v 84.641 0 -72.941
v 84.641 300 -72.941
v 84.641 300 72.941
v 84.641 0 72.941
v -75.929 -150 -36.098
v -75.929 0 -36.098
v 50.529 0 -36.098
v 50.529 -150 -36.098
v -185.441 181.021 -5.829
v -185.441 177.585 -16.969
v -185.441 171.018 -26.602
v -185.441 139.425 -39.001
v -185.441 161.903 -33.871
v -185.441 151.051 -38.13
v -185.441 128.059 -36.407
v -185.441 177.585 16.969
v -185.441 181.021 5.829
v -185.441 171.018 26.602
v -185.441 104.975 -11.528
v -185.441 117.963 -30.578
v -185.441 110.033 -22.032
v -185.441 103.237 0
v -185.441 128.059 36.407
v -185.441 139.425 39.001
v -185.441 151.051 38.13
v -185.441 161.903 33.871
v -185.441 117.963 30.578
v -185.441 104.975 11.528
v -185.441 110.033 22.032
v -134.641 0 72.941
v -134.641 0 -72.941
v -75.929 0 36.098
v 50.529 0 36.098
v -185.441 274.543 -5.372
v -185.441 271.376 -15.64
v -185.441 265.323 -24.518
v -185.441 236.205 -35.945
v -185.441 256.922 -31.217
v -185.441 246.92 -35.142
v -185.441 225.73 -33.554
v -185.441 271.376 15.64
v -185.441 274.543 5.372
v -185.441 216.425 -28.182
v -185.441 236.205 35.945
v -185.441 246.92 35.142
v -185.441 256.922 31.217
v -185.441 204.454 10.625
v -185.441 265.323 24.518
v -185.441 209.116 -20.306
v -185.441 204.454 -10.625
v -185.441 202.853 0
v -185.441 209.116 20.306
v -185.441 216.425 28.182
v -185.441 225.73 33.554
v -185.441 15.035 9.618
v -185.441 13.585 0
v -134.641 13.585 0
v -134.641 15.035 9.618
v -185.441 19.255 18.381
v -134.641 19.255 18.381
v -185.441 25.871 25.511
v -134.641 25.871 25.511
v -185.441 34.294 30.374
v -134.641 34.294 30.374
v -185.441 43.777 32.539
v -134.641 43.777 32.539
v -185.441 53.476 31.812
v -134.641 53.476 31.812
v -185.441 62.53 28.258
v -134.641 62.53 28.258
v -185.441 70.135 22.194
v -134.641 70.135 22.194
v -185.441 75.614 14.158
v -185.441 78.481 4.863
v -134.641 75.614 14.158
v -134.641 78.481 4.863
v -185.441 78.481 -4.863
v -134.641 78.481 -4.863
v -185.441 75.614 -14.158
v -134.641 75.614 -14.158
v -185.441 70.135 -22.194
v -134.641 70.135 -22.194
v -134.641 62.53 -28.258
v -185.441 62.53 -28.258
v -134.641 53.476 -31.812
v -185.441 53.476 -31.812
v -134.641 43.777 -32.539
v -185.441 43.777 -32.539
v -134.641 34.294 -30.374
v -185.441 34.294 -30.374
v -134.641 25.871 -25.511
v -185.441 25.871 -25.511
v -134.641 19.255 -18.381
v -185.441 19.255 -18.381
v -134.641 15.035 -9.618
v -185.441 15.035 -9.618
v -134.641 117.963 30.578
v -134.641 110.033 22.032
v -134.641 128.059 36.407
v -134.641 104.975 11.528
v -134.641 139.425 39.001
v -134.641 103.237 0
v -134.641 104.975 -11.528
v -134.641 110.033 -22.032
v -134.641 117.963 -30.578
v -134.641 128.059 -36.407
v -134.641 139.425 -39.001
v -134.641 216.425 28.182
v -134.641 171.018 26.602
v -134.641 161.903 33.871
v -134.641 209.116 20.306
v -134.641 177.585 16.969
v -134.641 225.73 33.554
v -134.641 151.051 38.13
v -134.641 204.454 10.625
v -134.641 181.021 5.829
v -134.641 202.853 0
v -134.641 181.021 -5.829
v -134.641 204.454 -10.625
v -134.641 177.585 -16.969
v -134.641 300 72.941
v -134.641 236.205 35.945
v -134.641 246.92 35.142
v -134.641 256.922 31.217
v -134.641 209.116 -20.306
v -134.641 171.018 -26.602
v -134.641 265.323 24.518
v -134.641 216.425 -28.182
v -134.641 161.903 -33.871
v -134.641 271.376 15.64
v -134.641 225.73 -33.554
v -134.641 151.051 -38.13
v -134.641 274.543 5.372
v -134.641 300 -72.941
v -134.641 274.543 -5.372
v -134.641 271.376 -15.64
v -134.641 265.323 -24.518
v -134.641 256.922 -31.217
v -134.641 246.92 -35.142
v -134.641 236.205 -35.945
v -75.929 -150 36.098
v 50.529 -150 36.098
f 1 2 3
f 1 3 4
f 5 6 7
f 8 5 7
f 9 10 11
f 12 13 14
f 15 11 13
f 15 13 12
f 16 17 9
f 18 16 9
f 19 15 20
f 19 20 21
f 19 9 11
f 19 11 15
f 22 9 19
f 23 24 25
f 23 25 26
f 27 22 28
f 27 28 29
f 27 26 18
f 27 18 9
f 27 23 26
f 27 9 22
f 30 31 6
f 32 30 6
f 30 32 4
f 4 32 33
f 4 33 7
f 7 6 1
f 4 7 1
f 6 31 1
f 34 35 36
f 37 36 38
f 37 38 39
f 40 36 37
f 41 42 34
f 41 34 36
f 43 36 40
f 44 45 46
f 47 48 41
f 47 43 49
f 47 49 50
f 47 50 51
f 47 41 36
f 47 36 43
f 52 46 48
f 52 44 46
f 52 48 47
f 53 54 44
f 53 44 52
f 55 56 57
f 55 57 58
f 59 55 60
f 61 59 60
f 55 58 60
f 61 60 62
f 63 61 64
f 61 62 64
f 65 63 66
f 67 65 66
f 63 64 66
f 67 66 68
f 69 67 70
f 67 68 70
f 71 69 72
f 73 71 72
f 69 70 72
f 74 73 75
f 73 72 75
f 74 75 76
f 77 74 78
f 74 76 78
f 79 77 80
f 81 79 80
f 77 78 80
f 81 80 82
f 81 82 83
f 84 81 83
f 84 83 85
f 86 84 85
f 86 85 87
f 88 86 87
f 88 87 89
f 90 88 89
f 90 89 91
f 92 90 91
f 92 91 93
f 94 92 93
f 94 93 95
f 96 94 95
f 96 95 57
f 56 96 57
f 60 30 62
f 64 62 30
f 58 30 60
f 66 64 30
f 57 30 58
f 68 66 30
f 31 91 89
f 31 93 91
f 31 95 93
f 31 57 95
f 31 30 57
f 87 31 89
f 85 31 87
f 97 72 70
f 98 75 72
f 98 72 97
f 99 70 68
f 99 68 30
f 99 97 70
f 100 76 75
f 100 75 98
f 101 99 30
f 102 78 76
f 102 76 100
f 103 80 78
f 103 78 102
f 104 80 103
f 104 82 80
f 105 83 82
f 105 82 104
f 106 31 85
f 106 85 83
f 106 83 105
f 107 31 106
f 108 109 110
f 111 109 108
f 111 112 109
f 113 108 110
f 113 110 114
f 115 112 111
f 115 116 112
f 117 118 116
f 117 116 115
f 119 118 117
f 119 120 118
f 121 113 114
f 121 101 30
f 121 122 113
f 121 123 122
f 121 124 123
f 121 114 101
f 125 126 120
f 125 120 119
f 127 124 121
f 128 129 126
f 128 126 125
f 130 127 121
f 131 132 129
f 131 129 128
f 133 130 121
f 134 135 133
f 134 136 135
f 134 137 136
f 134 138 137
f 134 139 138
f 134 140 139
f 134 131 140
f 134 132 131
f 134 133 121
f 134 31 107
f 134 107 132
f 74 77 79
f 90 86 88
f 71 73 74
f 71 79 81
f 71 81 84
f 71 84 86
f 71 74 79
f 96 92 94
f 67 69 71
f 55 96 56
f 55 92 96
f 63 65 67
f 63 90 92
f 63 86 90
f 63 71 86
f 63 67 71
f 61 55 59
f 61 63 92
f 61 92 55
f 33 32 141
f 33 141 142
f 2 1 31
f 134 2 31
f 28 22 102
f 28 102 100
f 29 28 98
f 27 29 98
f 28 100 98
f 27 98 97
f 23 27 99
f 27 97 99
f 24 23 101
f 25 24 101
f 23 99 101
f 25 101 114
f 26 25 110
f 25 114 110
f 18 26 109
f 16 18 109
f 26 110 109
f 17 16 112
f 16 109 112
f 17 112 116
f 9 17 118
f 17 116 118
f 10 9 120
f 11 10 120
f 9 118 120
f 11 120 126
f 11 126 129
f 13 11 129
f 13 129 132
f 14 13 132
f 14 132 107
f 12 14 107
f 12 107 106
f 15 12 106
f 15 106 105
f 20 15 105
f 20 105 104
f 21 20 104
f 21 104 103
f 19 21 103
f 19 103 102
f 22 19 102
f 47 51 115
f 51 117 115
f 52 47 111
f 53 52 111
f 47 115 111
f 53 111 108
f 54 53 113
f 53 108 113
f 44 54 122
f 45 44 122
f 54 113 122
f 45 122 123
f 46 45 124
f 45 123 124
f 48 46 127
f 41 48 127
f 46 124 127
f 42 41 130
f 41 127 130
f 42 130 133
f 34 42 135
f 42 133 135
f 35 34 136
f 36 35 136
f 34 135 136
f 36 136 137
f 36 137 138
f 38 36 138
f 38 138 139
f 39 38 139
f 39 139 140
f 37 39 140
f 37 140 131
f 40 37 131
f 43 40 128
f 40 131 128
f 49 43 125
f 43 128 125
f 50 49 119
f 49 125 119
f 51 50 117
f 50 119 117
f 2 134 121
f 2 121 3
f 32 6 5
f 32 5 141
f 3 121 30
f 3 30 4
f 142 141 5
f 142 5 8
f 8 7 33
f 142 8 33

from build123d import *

# Parameters (mm, degrees)
F0_W      = 151.8585681915
F0_H      = 72.1951127052
F1_DEPTH  = 150
F2_W      = 269.2821621895
F2_H      = 145.881652832
F3_DEPTH  = 300
F4_R      = 39.1105364466
F4_R_2    = 36.046178771
F4_R_3    = 32.629936561
F6_DEPTH  = 25.4
F7_DEPTH  = 50
F8_DEPTH  = 25.4
F9_DEPTH  = 25.4
F5_W      = 269.2821621895
F5_H      = 300
F10_DEPTH = 25.4
F11_DEPTH = 25.4


with BuildPart() as f1:
    # F0 (on Front) → F1 (new body)
    with BuildSketch(Plane.XZ):
        Rectangle(F0_W, F0_H)
    extrude(amount=F1_DEPTH)

    # F2 (on face) → F3 (join)
    with BuildSketch(Plane(origin=(0, 0, 0), x_dir=(-1, 0, 0), z_dir=(0, 1, 0))):
        Rectangle(F2_W, F2_H)
    extrude(amount=F3_DEPTH)

    # F4 (on face) → F6 (join)
    with BuildSketch(Plane(origin=(-134.6410810947, 0, 0), x_dir=(0, -1, 0), z_dir=(-1, 0, 0))):
        with Locations((-142.3476338387, 0)):
            Circle(F4_R)
        with Locations((-238.8992160559, 0)):
            Circle(F4_R_2)
        with Locations((-46.2152846158, 0)):
            Circle(F4_R_3)
    extrude(amount=F6_DEPTH)

    # F7 (cut): a face of the model
    f7_faces = [f1.faces().sort_by_distance(p)[0] for p in [
        (134.6410810947, 150, 0),
    ]]
    extrude(f7_faces, amount=-F7_DEPTH, mode=Mode.SUBTRACT)

    # F8 (cut): a face of the model
    f8_faces = [f1.faces().sort_by_distance(p)[0] for p in [
        (75.9292840958, -75, 0),
    ]]
    extrude(f8_faces, amount=-F8_DEPTH, mode=Mode.SUBTRACT)

    # F9 (add): faces of the model
    f9_faces = [f1.faces().sort_by_distance(p)[0] for p in [
        (-160.0410810947, 238.8992160559, 0),
        (-160.0410810947, 142.3476338387, 0),
        (-160.0410810947, 46.2152846158, 0),
    ]]
    extrude(f9_faces, amount=F9_DEPTH)

    # F5 (on face) → F10 (cut)
    with BuildSketch(Plane.XY.offset(72.940826416)):
        with Locations((0, 150)):
            Rectangle(F5_W, F5_H)
    extrude(amount=-F10_DEPTH, mode=Mode.SUBTRACT)

    # F11 (add): a face of the model
    f11_faces = [f1.faces().sort_by_distance(p)[0] for p in [
        (-25, 150, 47.540826416),
    ]]
    extrude(f11_faces, amount=F11_DEPTH)


solid = f1.part
